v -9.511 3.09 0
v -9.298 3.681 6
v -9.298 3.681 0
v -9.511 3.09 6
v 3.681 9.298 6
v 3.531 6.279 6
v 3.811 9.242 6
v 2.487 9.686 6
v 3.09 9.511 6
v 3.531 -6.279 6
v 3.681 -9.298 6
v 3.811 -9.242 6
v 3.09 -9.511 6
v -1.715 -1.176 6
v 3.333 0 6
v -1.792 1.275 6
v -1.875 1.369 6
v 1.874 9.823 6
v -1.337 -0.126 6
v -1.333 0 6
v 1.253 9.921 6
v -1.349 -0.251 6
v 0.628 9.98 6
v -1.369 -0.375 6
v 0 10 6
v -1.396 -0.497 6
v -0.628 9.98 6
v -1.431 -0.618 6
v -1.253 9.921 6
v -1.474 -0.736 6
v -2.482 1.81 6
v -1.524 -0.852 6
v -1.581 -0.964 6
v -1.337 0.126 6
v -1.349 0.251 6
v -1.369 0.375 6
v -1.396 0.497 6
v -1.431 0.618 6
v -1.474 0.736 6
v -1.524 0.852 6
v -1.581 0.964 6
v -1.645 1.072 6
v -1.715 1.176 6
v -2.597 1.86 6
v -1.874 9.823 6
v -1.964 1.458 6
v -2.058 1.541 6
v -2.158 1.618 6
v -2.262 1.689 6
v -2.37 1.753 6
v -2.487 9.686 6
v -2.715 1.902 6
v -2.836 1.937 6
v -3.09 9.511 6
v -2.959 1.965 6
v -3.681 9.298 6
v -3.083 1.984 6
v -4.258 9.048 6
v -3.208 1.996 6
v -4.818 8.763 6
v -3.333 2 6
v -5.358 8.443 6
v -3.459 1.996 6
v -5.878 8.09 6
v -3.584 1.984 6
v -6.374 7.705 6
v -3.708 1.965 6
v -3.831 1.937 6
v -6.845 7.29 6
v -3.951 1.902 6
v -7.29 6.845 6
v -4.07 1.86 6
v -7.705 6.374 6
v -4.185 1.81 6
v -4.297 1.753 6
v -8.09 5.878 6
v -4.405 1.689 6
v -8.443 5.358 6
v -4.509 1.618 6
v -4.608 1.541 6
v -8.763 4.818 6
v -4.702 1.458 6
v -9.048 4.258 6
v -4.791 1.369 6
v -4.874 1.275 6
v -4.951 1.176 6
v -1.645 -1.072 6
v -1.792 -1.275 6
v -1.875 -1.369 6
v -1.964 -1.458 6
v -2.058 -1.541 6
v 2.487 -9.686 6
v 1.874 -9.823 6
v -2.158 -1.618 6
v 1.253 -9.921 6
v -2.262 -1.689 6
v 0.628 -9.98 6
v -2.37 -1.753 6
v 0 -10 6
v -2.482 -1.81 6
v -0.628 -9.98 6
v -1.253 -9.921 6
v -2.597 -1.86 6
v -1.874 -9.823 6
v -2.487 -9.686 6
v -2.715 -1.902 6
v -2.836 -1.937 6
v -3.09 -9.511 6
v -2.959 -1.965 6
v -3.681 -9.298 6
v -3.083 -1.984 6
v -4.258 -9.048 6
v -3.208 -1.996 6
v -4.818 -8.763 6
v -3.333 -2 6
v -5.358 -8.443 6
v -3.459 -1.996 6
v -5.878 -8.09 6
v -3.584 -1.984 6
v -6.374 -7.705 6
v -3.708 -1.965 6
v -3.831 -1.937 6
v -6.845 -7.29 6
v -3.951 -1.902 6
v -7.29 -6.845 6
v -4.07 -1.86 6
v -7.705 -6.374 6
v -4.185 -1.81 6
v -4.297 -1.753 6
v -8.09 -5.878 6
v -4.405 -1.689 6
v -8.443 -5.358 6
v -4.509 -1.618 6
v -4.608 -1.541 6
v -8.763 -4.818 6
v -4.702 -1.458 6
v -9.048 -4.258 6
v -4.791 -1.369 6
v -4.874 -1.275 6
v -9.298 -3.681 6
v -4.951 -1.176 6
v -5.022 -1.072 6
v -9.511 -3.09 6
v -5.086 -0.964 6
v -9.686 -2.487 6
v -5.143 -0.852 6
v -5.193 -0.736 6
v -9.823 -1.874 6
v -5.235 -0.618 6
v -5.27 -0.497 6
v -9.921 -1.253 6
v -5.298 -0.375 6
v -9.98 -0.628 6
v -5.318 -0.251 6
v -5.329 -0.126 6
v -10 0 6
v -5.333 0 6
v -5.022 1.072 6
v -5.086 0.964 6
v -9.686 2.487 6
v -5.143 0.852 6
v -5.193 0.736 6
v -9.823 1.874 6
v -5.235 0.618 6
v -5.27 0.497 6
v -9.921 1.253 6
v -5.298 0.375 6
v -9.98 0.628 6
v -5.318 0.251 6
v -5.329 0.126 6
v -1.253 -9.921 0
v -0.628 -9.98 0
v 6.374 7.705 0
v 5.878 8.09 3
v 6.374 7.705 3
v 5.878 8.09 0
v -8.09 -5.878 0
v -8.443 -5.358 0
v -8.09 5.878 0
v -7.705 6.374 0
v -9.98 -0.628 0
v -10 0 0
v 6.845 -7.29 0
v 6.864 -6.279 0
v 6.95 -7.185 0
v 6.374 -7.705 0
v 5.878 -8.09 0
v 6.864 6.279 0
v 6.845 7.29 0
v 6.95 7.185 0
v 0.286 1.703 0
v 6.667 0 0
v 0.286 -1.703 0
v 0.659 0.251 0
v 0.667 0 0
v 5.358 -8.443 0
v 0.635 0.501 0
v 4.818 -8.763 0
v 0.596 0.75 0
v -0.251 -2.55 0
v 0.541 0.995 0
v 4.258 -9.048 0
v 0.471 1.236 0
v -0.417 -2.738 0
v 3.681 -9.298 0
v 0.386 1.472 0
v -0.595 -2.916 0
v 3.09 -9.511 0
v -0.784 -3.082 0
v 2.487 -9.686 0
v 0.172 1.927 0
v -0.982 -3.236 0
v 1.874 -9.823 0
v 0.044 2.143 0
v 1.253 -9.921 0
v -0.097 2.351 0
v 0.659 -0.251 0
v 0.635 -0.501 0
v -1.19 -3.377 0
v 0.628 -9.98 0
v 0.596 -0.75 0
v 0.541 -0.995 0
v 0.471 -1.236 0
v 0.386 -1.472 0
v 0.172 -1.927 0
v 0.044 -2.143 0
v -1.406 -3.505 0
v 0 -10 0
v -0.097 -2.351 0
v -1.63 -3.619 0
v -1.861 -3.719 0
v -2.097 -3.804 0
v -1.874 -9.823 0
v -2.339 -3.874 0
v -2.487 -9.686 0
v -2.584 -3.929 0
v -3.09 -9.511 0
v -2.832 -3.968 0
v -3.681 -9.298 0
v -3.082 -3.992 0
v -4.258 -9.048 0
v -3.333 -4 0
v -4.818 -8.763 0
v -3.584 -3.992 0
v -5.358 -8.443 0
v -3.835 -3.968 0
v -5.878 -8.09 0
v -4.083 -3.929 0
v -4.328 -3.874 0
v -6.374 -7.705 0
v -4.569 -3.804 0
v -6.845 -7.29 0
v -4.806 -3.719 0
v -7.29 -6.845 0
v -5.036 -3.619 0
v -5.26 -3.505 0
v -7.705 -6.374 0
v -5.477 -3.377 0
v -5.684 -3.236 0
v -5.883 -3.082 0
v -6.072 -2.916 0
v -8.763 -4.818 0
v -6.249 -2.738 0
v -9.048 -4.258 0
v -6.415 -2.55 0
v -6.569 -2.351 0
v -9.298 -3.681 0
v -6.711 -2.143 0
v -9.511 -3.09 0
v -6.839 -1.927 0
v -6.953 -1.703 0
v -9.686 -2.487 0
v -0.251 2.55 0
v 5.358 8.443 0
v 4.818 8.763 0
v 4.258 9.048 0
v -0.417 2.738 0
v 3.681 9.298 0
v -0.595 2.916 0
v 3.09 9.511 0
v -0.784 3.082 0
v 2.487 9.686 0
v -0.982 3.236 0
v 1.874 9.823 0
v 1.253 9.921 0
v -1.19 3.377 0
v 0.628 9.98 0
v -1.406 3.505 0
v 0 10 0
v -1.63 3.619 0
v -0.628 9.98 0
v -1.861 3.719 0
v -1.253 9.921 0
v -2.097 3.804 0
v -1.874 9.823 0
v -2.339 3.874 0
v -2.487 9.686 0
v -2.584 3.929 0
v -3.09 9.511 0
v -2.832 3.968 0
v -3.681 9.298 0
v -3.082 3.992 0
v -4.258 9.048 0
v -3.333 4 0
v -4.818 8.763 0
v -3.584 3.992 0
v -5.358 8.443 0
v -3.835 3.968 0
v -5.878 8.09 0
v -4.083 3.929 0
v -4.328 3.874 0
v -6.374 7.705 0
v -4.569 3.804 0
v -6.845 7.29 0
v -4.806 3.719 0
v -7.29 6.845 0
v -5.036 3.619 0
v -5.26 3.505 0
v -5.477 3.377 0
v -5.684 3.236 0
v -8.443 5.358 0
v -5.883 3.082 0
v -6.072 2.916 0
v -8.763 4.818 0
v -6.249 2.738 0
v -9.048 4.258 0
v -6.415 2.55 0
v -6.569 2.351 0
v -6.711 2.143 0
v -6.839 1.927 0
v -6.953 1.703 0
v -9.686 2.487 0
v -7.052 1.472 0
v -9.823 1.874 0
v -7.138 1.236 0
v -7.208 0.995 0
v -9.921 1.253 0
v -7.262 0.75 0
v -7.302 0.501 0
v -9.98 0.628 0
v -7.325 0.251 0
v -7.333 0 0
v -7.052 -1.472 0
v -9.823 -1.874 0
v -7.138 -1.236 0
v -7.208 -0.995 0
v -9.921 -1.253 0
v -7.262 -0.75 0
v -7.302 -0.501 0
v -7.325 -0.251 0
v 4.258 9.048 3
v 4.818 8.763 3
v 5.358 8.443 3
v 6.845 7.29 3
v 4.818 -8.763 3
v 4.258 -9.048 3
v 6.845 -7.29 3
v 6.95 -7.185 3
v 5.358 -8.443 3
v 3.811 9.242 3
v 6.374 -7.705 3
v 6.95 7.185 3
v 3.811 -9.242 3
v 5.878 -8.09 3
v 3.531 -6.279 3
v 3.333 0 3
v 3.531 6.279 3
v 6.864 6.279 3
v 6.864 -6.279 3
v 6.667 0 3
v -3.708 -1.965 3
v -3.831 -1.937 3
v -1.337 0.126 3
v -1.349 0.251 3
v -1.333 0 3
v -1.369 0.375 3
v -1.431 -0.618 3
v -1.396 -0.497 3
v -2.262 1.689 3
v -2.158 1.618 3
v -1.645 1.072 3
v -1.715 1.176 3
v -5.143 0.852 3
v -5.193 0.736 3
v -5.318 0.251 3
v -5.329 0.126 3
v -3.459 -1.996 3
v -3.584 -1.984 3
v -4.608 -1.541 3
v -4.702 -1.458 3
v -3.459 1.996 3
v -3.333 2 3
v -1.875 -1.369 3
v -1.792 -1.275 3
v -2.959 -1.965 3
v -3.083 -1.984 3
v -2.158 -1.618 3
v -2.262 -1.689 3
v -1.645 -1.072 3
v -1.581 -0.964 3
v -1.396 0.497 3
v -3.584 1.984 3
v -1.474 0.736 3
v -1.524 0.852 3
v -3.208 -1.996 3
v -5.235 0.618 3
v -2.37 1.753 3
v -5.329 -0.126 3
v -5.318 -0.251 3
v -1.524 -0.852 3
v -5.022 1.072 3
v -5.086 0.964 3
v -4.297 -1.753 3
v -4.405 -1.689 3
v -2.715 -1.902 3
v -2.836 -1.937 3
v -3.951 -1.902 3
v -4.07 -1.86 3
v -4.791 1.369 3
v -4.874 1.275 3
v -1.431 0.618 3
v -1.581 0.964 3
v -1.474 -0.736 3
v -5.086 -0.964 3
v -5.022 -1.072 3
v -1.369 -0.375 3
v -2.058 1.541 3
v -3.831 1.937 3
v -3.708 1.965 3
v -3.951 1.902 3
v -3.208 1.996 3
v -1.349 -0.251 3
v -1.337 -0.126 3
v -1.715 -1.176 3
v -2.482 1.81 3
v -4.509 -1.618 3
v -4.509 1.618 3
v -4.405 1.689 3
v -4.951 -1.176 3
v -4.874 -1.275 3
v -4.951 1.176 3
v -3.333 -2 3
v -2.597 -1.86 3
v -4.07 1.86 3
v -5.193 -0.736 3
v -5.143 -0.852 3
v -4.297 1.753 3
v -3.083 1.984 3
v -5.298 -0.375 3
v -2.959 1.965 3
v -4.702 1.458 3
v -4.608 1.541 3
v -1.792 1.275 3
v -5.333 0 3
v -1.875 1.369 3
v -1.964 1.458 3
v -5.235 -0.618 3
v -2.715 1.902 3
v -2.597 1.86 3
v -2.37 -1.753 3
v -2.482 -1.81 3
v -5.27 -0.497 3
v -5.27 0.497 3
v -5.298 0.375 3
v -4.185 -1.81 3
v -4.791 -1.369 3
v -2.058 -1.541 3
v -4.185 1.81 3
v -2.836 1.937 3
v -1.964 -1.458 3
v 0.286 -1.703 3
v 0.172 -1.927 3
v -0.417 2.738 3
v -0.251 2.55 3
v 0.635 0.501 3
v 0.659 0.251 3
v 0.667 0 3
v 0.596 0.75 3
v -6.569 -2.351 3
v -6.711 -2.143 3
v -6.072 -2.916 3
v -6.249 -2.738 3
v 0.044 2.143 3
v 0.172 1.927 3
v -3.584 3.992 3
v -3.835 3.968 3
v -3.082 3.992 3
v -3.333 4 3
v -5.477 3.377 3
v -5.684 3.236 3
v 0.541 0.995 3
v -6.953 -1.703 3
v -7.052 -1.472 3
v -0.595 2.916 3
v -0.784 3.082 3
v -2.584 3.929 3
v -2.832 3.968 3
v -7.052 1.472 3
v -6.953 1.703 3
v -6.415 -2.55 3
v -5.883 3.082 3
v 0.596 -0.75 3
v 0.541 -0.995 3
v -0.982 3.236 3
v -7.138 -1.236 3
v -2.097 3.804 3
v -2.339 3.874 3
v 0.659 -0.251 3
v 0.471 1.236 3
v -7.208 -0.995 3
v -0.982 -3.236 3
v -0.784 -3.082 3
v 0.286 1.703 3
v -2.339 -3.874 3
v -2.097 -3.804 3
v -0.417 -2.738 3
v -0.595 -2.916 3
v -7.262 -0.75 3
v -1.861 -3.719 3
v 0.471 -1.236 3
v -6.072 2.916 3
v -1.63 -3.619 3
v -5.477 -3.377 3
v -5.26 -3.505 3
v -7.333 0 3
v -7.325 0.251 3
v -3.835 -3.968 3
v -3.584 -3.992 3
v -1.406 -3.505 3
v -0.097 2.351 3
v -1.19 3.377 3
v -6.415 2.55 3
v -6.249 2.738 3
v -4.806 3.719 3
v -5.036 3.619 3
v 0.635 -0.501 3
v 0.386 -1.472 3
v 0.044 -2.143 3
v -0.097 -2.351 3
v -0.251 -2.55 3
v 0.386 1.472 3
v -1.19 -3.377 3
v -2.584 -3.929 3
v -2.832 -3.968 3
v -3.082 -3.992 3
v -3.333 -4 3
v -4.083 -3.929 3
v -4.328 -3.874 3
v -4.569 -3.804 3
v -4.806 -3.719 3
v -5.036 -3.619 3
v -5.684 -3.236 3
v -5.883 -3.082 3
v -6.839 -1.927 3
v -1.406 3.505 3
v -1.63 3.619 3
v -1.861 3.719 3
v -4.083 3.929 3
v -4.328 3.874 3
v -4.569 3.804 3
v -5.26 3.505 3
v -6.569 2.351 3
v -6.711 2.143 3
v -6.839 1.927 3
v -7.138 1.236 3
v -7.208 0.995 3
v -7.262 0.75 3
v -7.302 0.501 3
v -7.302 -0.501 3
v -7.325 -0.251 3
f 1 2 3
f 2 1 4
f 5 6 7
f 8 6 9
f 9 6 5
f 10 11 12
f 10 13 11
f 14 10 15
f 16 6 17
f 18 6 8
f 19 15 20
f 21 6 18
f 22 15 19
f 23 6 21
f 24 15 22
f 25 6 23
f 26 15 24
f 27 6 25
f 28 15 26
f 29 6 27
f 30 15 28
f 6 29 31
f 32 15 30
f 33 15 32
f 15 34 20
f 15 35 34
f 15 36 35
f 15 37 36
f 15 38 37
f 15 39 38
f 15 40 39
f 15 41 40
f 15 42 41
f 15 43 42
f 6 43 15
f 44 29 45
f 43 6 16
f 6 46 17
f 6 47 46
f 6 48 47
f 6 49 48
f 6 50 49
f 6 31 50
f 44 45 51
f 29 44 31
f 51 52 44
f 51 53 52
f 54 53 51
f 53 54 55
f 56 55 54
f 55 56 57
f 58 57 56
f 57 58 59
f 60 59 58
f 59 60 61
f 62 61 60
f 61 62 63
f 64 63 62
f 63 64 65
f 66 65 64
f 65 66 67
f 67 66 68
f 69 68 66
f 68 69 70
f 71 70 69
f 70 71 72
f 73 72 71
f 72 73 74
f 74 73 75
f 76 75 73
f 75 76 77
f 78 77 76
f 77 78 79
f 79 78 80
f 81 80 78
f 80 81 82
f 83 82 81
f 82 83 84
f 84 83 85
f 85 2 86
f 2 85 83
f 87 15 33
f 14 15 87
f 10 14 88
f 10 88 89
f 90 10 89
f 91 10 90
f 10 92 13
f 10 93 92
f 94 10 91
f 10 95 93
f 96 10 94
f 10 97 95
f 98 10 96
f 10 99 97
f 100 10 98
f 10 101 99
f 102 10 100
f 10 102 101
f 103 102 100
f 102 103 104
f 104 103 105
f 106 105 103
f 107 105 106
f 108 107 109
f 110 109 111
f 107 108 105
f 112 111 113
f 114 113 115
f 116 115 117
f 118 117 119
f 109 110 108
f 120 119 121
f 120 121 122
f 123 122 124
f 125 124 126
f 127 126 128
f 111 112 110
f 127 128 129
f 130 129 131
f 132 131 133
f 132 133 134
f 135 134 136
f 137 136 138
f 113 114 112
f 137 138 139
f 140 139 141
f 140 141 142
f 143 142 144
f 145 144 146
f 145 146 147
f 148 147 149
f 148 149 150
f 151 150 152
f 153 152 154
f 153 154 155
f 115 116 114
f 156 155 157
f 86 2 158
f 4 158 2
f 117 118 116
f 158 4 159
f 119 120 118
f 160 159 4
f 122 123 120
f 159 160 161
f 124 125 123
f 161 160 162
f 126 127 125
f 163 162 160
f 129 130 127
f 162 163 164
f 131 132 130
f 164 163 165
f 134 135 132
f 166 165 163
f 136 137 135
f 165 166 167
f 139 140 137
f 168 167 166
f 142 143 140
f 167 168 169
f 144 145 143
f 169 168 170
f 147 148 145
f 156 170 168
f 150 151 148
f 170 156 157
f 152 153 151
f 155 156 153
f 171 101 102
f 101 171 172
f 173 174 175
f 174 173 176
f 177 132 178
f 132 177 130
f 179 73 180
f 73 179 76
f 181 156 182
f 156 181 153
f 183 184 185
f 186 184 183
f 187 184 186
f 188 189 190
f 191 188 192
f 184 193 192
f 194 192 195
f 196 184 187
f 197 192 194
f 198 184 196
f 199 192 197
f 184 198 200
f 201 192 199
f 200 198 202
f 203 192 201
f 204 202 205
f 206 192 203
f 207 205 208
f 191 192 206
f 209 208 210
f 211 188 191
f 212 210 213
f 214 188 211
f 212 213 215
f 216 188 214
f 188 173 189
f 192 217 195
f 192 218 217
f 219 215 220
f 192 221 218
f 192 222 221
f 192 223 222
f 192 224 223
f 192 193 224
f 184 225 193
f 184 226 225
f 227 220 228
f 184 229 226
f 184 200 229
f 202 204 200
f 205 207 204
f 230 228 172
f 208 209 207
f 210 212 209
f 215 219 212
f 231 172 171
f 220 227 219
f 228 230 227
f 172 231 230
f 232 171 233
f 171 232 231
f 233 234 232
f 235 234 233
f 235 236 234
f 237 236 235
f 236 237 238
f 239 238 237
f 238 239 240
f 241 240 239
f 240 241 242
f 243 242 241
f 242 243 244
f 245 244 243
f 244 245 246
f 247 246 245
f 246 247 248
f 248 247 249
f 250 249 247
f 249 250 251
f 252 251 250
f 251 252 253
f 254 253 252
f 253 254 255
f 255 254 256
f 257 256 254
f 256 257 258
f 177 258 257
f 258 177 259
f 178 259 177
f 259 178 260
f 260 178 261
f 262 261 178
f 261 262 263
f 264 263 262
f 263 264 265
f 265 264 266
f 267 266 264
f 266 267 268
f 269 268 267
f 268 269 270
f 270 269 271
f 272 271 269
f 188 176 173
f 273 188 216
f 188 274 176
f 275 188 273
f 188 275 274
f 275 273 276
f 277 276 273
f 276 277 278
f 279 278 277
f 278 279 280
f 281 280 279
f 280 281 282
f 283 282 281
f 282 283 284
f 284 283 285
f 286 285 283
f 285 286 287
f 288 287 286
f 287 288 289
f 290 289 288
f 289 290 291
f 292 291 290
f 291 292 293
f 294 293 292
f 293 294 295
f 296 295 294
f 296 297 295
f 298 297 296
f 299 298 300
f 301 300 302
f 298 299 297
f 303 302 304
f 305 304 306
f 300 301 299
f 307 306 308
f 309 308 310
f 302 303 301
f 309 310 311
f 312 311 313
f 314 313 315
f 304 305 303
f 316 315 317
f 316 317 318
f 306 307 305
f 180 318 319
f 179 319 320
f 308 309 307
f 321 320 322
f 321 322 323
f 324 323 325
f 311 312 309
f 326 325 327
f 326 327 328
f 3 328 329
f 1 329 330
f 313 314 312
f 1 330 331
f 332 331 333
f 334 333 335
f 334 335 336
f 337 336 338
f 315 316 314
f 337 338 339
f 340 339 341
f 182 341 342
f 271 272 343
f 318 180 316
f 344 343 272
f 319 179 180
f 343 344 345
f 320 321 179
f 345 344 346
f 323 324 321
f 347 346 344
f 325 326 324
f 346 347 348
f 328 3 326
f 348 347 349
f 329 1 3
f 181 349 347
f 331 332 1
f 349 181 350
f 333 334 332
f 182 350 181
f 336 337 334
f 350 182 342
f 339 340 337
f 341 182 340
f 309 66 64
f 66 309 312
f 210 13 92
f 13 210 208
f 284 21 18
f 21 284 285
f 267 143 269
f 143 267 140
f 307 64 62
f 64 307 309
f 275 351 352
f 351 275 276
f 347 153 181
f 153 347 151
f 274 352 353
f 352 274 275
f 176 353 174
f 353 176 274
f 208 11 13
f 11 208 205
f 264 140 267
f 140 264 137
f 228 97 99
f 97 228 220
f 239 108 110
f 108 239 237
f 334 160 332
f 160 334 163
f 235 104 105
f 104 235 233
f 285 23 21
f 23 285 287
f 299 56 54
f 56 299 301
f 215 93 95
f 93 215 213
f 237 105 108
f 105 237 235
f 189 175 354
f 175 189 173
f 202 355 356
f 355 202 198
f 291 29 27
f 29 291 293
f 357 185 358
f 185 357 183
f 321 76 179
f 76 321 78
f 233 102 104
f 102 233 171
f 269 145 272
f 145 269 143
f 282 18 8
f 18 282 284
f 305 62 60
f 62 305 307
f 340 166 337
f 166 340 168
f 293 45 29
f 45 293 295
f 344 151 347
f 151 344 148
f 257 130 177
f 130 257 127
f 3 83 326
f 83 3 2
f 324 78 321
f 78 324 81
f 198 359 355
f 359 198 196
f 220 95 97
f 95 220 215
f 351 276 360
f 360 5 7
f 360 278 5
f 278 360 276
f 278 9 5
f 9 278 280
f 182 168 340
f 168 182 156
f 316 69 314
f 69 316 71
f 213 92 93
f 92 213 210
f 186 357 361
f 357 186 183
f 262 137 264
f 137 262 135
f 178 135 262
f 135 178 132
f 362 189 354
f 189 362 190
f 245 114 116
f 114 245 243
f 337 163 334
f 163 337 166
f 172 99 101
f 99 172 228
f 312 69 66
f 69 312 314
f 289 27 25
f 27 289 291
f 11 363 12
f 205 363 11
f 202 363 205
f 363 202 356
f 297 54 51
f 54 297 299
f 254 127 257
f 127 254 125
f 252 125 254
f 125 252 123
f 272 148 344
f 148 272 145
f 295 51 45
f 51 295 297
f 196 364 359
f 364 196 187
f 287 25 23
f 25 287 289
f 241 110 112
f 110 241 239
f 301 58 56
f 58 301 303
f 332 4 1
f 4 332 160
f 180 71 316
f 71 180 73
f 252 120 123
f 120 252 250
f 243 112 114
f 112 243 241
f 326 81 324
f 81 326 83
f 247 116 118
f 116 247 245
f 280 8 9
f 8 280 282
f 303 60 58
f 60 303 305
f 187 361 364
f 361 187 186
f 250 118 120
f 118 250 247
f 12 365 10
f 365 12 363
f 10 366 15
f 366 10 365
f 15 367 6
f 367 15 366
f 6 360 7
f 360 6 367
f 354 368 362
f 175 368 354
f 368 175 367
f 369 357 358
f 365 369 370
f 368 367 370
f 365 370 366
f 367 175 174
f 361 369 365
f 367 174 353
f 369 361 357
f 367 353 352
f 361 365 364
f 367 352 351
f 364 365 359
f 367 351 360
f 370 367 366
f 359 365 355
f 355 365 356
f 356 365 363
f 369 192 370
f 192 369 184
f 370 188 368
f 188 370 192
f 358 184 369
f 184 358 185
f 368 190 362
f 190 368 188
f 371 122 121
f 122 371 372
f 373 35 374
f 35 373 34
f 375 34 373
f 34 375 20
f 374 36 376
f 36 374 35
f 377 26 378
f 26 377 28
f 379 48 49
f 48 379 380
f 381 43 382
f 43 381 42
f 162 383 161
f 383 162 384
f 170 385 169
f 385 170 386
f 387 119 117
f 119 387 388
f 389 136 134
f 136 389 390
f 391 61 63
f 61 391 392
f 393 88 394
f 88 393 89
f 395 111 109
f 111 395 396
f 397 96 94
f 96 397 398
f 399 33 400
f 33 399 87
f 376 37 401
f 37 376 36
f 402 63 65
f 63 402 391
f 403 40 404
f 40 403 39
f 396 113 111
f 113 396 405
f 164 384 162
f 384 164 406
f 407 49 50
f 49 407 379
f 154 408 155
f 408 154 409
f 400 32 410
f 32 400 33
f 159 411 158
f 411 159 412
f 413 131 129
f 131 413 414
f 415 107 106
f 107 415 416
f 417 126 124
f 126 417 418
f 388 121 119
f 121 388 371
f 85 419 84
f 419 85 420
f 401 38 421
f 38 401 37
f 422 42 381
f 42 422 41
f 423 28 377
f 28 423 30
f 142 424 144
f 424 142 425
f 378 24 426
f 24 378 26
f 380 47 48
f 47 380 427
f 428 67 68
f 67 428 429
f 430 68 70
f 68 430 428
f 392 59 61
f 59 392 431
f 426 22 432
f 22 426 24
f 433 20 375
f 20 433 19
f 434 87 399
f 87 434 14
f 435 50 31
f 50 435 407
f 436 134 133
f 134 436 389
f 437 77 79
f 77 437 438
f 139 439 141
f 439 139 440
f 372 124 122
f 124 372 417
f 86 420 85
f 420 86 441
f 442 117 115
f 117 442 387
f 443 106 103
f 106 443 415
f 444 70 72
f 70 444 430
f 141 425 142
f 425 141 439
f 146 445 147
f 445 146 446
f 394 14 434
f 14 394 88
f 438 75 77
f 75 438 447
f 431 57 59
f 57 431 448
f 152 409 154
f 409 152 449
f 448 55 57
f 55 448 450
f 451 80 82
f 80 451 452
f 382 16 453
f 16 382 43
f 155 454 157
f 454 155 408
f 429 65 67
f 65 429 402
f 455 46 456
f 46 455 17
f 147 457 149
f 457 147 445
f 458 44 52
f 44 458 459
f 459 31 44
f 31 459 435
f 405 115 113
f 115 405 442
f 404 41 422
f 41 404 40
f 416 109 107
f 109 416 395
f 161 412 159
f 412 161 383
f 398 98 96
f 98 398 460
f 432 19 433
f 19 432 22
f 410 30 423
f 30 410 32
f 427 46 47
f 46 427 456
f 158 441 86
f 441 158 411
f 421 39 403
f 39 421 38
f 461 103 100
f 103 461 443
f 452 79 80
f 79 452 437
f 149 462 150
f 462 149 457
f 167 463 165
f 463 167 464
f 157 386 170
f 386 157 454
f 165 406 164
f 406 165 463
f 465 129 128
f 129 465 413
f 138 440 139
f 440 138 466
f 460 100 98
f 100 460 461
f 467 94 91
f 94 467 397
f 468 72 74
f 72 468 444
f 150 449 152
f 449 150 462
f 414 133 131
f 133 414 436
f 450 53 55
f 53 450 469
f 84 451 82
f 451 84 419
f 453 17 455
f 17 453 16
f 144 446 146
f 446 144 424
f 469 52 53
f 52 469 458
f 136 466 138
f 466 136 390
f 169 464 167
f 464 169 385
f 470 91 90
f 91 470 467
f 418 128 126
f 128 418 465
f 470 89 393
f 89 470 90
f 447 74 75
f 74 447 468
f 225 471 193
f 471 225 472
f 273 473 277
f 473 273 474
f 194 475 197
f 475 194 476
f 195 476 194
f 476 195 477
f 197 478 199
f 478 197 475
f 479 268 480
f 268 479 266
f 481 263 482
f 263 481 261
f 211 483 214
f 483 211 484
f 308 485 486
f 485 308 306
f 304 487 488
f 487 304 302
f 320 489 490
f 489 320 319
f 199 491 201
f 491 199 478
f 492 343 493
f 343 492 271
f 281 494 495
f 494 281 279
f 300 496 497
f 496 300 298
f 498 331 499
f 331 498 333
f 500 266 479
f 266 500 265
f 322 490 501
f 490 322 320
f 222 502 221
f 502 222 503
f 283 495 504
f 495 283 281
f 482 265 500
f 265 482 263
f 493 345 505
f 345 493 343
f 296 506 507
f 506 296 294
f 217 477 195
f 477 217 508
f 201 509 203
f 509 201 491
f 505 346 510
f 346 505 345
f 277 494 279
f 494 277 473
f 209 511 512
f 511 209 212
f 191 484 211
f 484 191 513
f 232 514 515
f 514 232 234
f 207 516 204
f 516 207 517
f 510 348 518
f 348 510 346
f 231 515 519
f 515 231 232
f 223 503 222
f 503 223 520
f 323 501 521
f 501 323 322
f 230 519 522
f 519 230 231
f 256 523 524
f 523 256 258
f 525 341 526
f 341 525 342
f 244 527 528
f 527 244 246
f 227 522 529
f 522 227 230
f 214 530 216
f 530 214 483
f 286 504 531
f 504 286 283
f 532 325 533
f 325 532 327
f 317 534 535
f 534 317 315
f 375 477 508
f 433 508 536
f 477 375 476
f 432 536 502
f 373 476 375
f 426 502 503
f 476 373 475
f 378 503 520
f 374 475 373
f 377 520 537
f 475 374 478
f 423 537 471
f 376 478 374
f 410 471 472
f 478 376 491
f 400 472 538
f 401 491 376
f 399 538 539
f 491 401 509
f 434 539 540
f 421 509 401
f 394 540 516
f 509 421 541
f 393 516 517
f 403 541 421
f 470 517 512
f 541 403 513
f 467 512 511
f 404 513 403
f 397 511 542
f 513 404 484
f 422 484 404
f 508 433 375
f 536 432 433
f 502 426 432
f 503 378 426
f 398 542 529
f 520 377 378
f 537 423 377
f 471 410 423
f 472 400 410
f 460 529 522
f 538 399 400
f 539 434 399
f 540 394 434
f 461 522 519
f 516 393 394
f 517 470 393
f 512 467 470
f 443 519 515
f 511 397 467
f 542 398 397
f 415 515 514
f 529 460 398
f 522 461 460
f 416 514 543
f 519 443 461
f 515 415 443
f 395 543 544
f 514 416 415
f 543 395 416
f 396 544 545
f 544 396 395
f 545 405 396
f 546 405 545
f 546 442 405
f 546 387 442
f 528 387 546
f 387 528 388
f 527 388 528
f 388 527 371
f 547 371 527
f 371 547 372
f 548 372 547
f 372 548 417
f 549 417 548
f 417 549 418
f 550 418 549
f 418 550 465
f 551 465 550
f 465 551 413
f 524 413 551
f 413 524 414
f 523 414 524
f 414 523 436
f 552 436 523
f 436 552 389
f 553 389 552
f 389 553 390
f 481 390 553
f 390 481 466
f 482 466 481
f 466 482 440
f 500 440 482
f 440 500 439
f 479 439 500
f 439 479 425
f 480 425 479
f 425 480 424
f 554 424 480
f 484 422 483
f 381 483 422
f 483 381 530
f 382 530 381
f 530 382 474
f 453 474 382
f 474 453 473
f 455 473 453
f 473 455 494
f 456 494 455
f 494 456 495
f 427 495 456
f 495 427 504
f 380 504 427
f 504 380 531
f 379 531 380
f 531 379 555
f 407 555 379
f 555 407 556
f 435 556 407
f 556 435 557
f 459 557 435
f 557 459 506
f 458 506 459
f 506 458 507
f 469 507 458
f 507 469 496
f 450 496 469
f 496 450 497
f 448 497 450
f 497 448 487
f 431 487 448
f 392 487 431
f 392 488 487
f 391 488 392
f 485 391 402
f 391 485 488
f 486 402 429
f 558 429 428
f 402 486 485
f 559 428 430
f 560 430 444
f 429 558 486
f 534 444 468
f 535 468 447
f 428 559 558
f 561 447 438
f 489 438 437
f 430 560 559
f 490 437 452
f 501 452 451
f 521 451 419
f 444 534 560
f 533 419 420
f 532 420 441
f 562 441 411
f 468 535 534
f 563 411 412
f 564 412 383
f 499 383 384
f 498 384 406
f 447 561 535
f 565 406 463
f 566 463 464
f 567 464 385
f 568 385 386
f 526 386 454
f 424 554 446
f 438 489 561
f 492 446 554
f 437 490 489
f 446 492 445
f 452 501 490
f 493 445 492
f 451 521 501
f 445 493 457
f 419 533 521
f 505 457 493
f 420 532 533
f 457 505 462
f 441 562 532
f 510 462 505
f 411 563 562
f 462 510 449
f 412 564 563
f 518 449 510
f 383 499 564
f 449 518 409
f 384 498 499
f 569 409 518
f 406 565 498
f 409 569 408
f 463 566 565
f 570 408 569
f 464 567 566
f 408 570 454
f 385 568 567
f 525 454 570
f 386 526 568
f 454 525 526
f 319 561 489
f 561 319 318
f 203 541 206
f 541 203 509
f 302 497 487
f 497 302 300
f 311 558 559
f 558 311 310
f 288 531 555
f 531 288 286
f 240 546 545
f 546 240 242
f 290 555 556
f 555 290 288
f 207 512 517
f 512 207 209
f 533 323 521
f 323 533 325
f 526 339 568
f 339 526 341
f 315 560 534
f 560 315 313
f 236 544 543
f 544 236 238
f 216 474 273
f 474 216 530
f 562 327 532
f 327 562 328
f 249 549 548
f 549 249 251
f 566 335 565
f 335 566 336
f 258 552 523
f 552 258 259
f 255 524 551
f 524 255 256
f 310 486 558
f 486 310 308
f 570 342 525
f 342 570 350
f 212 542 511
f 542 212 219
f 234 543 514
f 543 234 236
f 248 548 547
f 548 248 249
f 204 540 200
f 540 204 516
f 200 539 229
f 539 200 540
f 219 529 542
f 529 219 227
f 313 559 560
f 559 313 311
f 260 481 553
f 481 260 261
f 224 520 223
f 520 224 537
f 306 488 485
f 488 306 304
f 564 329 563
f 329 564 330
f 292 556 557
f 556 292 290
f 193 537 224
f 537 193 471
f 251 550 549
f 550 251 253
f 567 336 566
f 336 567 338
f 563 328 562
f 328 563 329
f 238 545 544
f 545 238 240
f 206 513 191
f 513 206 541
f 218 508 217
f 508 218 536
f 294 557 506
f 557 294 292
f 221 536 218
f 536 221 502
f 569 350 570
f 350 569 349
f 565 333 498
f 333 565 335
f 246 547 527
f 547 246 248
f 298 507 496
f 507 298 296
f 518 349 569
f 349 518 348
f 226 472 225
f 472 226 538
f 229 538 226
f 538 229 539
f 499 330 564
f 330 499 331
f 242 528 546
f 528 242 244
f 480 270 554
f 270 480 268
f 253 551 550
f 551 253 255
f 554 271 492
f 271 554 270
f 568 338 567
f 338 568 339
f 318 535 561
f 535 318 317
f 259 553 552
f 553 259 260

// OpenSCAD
/* [Support] */
diam_ext_support=20; // [10:1:30]
epaisseur_sur_vitre=3; // [0:0.1:10]
encoche_percent=0.5; // [0.3:0.1:0.7]
epaisseur_sous_vitre=0; // [0:0.1:10]

/* [Screw] */
vis_diam=4; // [2:0.1:5]
vis_tete_diam=8; // [4:0.1:10]

/* [Glass] */
vitre_diam=200; // [150:1:250]
vitre_haut=3; // [2:0.1:5]

/* [Hidden] */
artefact=0.05;
globalView=0; //[0,1] Put 1 if you want to see a global view

module support_vitre() {
    position_encoche=diam_ext_support/6;
    difference() {
        union(){
        cylinder(h=epaisseur_sur_vitre+vitre_haut+epaisseur_sous_vitre,d=diam_ext_support,$fn=100); //Piece brute
        translate([0,0,epaisseur_sur_vitre+vitre_haut])
            cylinder(h=epaisseur_sous_vitre,d=diam_ext_support,$fn=100); //Piece dessous
        }
        translate([vitre_diam/2+position_encoche,0,epaisseur_sur_vitre])
            cylinder(h=vitre_haut+artefact,d=vitre_diam,$fn=100); //Trou Vitre

        translate([vitre_diam/2+position_encoche/encoche_percent,0,-artefact])
            cylinder(h=vitre_haut+epaisseur_sur_vitre+2*artefact,d=vitre_diam,$fn=100); //Encoche dessus vitre

        translate([-position_encoche,0,-artefact])
            cylinder(h=epaisseur_sur_vitre+vitre_haut+epaisseur_sous_vitre+2*artefact,d=vis_diam,$fn=100); //Trou vis
        
        translate([-position_encoche,0,-artefact])
            cylinder(h=epaisseur_sur_vitre+artefact,d=vis_tete_diam,$fn=100); //Trou tete vis
        }
}

module glass() {
    translate([0,0,-artefact])
        cylinder(h=vitre_haut+artefact,d=vitre_diam,$fn=100); //Vitre
}

if (globalView) %translate([0,0,10]) rotate([90,0,0]) text("Down view");
if (globalView) %color("LightCyan") translate([0,0,epaisseur_sur_vitre-artefact]) glass();

if (globalView) color("gold") translate([-vitre_diam/2-diam_ext_support/6,0,0]) support_vitre();
else support_vitre();

if (globalView)
    for(angle=[60:60:300])
        %color("gold") rotate([0,0,angle]) translate([-vitre_diam/2-diam_ext_support/6,0,0]) support_vitre();

if (globalView) %translate([0,0,-10]) rotate([-90,0,0]) text("Top view");
